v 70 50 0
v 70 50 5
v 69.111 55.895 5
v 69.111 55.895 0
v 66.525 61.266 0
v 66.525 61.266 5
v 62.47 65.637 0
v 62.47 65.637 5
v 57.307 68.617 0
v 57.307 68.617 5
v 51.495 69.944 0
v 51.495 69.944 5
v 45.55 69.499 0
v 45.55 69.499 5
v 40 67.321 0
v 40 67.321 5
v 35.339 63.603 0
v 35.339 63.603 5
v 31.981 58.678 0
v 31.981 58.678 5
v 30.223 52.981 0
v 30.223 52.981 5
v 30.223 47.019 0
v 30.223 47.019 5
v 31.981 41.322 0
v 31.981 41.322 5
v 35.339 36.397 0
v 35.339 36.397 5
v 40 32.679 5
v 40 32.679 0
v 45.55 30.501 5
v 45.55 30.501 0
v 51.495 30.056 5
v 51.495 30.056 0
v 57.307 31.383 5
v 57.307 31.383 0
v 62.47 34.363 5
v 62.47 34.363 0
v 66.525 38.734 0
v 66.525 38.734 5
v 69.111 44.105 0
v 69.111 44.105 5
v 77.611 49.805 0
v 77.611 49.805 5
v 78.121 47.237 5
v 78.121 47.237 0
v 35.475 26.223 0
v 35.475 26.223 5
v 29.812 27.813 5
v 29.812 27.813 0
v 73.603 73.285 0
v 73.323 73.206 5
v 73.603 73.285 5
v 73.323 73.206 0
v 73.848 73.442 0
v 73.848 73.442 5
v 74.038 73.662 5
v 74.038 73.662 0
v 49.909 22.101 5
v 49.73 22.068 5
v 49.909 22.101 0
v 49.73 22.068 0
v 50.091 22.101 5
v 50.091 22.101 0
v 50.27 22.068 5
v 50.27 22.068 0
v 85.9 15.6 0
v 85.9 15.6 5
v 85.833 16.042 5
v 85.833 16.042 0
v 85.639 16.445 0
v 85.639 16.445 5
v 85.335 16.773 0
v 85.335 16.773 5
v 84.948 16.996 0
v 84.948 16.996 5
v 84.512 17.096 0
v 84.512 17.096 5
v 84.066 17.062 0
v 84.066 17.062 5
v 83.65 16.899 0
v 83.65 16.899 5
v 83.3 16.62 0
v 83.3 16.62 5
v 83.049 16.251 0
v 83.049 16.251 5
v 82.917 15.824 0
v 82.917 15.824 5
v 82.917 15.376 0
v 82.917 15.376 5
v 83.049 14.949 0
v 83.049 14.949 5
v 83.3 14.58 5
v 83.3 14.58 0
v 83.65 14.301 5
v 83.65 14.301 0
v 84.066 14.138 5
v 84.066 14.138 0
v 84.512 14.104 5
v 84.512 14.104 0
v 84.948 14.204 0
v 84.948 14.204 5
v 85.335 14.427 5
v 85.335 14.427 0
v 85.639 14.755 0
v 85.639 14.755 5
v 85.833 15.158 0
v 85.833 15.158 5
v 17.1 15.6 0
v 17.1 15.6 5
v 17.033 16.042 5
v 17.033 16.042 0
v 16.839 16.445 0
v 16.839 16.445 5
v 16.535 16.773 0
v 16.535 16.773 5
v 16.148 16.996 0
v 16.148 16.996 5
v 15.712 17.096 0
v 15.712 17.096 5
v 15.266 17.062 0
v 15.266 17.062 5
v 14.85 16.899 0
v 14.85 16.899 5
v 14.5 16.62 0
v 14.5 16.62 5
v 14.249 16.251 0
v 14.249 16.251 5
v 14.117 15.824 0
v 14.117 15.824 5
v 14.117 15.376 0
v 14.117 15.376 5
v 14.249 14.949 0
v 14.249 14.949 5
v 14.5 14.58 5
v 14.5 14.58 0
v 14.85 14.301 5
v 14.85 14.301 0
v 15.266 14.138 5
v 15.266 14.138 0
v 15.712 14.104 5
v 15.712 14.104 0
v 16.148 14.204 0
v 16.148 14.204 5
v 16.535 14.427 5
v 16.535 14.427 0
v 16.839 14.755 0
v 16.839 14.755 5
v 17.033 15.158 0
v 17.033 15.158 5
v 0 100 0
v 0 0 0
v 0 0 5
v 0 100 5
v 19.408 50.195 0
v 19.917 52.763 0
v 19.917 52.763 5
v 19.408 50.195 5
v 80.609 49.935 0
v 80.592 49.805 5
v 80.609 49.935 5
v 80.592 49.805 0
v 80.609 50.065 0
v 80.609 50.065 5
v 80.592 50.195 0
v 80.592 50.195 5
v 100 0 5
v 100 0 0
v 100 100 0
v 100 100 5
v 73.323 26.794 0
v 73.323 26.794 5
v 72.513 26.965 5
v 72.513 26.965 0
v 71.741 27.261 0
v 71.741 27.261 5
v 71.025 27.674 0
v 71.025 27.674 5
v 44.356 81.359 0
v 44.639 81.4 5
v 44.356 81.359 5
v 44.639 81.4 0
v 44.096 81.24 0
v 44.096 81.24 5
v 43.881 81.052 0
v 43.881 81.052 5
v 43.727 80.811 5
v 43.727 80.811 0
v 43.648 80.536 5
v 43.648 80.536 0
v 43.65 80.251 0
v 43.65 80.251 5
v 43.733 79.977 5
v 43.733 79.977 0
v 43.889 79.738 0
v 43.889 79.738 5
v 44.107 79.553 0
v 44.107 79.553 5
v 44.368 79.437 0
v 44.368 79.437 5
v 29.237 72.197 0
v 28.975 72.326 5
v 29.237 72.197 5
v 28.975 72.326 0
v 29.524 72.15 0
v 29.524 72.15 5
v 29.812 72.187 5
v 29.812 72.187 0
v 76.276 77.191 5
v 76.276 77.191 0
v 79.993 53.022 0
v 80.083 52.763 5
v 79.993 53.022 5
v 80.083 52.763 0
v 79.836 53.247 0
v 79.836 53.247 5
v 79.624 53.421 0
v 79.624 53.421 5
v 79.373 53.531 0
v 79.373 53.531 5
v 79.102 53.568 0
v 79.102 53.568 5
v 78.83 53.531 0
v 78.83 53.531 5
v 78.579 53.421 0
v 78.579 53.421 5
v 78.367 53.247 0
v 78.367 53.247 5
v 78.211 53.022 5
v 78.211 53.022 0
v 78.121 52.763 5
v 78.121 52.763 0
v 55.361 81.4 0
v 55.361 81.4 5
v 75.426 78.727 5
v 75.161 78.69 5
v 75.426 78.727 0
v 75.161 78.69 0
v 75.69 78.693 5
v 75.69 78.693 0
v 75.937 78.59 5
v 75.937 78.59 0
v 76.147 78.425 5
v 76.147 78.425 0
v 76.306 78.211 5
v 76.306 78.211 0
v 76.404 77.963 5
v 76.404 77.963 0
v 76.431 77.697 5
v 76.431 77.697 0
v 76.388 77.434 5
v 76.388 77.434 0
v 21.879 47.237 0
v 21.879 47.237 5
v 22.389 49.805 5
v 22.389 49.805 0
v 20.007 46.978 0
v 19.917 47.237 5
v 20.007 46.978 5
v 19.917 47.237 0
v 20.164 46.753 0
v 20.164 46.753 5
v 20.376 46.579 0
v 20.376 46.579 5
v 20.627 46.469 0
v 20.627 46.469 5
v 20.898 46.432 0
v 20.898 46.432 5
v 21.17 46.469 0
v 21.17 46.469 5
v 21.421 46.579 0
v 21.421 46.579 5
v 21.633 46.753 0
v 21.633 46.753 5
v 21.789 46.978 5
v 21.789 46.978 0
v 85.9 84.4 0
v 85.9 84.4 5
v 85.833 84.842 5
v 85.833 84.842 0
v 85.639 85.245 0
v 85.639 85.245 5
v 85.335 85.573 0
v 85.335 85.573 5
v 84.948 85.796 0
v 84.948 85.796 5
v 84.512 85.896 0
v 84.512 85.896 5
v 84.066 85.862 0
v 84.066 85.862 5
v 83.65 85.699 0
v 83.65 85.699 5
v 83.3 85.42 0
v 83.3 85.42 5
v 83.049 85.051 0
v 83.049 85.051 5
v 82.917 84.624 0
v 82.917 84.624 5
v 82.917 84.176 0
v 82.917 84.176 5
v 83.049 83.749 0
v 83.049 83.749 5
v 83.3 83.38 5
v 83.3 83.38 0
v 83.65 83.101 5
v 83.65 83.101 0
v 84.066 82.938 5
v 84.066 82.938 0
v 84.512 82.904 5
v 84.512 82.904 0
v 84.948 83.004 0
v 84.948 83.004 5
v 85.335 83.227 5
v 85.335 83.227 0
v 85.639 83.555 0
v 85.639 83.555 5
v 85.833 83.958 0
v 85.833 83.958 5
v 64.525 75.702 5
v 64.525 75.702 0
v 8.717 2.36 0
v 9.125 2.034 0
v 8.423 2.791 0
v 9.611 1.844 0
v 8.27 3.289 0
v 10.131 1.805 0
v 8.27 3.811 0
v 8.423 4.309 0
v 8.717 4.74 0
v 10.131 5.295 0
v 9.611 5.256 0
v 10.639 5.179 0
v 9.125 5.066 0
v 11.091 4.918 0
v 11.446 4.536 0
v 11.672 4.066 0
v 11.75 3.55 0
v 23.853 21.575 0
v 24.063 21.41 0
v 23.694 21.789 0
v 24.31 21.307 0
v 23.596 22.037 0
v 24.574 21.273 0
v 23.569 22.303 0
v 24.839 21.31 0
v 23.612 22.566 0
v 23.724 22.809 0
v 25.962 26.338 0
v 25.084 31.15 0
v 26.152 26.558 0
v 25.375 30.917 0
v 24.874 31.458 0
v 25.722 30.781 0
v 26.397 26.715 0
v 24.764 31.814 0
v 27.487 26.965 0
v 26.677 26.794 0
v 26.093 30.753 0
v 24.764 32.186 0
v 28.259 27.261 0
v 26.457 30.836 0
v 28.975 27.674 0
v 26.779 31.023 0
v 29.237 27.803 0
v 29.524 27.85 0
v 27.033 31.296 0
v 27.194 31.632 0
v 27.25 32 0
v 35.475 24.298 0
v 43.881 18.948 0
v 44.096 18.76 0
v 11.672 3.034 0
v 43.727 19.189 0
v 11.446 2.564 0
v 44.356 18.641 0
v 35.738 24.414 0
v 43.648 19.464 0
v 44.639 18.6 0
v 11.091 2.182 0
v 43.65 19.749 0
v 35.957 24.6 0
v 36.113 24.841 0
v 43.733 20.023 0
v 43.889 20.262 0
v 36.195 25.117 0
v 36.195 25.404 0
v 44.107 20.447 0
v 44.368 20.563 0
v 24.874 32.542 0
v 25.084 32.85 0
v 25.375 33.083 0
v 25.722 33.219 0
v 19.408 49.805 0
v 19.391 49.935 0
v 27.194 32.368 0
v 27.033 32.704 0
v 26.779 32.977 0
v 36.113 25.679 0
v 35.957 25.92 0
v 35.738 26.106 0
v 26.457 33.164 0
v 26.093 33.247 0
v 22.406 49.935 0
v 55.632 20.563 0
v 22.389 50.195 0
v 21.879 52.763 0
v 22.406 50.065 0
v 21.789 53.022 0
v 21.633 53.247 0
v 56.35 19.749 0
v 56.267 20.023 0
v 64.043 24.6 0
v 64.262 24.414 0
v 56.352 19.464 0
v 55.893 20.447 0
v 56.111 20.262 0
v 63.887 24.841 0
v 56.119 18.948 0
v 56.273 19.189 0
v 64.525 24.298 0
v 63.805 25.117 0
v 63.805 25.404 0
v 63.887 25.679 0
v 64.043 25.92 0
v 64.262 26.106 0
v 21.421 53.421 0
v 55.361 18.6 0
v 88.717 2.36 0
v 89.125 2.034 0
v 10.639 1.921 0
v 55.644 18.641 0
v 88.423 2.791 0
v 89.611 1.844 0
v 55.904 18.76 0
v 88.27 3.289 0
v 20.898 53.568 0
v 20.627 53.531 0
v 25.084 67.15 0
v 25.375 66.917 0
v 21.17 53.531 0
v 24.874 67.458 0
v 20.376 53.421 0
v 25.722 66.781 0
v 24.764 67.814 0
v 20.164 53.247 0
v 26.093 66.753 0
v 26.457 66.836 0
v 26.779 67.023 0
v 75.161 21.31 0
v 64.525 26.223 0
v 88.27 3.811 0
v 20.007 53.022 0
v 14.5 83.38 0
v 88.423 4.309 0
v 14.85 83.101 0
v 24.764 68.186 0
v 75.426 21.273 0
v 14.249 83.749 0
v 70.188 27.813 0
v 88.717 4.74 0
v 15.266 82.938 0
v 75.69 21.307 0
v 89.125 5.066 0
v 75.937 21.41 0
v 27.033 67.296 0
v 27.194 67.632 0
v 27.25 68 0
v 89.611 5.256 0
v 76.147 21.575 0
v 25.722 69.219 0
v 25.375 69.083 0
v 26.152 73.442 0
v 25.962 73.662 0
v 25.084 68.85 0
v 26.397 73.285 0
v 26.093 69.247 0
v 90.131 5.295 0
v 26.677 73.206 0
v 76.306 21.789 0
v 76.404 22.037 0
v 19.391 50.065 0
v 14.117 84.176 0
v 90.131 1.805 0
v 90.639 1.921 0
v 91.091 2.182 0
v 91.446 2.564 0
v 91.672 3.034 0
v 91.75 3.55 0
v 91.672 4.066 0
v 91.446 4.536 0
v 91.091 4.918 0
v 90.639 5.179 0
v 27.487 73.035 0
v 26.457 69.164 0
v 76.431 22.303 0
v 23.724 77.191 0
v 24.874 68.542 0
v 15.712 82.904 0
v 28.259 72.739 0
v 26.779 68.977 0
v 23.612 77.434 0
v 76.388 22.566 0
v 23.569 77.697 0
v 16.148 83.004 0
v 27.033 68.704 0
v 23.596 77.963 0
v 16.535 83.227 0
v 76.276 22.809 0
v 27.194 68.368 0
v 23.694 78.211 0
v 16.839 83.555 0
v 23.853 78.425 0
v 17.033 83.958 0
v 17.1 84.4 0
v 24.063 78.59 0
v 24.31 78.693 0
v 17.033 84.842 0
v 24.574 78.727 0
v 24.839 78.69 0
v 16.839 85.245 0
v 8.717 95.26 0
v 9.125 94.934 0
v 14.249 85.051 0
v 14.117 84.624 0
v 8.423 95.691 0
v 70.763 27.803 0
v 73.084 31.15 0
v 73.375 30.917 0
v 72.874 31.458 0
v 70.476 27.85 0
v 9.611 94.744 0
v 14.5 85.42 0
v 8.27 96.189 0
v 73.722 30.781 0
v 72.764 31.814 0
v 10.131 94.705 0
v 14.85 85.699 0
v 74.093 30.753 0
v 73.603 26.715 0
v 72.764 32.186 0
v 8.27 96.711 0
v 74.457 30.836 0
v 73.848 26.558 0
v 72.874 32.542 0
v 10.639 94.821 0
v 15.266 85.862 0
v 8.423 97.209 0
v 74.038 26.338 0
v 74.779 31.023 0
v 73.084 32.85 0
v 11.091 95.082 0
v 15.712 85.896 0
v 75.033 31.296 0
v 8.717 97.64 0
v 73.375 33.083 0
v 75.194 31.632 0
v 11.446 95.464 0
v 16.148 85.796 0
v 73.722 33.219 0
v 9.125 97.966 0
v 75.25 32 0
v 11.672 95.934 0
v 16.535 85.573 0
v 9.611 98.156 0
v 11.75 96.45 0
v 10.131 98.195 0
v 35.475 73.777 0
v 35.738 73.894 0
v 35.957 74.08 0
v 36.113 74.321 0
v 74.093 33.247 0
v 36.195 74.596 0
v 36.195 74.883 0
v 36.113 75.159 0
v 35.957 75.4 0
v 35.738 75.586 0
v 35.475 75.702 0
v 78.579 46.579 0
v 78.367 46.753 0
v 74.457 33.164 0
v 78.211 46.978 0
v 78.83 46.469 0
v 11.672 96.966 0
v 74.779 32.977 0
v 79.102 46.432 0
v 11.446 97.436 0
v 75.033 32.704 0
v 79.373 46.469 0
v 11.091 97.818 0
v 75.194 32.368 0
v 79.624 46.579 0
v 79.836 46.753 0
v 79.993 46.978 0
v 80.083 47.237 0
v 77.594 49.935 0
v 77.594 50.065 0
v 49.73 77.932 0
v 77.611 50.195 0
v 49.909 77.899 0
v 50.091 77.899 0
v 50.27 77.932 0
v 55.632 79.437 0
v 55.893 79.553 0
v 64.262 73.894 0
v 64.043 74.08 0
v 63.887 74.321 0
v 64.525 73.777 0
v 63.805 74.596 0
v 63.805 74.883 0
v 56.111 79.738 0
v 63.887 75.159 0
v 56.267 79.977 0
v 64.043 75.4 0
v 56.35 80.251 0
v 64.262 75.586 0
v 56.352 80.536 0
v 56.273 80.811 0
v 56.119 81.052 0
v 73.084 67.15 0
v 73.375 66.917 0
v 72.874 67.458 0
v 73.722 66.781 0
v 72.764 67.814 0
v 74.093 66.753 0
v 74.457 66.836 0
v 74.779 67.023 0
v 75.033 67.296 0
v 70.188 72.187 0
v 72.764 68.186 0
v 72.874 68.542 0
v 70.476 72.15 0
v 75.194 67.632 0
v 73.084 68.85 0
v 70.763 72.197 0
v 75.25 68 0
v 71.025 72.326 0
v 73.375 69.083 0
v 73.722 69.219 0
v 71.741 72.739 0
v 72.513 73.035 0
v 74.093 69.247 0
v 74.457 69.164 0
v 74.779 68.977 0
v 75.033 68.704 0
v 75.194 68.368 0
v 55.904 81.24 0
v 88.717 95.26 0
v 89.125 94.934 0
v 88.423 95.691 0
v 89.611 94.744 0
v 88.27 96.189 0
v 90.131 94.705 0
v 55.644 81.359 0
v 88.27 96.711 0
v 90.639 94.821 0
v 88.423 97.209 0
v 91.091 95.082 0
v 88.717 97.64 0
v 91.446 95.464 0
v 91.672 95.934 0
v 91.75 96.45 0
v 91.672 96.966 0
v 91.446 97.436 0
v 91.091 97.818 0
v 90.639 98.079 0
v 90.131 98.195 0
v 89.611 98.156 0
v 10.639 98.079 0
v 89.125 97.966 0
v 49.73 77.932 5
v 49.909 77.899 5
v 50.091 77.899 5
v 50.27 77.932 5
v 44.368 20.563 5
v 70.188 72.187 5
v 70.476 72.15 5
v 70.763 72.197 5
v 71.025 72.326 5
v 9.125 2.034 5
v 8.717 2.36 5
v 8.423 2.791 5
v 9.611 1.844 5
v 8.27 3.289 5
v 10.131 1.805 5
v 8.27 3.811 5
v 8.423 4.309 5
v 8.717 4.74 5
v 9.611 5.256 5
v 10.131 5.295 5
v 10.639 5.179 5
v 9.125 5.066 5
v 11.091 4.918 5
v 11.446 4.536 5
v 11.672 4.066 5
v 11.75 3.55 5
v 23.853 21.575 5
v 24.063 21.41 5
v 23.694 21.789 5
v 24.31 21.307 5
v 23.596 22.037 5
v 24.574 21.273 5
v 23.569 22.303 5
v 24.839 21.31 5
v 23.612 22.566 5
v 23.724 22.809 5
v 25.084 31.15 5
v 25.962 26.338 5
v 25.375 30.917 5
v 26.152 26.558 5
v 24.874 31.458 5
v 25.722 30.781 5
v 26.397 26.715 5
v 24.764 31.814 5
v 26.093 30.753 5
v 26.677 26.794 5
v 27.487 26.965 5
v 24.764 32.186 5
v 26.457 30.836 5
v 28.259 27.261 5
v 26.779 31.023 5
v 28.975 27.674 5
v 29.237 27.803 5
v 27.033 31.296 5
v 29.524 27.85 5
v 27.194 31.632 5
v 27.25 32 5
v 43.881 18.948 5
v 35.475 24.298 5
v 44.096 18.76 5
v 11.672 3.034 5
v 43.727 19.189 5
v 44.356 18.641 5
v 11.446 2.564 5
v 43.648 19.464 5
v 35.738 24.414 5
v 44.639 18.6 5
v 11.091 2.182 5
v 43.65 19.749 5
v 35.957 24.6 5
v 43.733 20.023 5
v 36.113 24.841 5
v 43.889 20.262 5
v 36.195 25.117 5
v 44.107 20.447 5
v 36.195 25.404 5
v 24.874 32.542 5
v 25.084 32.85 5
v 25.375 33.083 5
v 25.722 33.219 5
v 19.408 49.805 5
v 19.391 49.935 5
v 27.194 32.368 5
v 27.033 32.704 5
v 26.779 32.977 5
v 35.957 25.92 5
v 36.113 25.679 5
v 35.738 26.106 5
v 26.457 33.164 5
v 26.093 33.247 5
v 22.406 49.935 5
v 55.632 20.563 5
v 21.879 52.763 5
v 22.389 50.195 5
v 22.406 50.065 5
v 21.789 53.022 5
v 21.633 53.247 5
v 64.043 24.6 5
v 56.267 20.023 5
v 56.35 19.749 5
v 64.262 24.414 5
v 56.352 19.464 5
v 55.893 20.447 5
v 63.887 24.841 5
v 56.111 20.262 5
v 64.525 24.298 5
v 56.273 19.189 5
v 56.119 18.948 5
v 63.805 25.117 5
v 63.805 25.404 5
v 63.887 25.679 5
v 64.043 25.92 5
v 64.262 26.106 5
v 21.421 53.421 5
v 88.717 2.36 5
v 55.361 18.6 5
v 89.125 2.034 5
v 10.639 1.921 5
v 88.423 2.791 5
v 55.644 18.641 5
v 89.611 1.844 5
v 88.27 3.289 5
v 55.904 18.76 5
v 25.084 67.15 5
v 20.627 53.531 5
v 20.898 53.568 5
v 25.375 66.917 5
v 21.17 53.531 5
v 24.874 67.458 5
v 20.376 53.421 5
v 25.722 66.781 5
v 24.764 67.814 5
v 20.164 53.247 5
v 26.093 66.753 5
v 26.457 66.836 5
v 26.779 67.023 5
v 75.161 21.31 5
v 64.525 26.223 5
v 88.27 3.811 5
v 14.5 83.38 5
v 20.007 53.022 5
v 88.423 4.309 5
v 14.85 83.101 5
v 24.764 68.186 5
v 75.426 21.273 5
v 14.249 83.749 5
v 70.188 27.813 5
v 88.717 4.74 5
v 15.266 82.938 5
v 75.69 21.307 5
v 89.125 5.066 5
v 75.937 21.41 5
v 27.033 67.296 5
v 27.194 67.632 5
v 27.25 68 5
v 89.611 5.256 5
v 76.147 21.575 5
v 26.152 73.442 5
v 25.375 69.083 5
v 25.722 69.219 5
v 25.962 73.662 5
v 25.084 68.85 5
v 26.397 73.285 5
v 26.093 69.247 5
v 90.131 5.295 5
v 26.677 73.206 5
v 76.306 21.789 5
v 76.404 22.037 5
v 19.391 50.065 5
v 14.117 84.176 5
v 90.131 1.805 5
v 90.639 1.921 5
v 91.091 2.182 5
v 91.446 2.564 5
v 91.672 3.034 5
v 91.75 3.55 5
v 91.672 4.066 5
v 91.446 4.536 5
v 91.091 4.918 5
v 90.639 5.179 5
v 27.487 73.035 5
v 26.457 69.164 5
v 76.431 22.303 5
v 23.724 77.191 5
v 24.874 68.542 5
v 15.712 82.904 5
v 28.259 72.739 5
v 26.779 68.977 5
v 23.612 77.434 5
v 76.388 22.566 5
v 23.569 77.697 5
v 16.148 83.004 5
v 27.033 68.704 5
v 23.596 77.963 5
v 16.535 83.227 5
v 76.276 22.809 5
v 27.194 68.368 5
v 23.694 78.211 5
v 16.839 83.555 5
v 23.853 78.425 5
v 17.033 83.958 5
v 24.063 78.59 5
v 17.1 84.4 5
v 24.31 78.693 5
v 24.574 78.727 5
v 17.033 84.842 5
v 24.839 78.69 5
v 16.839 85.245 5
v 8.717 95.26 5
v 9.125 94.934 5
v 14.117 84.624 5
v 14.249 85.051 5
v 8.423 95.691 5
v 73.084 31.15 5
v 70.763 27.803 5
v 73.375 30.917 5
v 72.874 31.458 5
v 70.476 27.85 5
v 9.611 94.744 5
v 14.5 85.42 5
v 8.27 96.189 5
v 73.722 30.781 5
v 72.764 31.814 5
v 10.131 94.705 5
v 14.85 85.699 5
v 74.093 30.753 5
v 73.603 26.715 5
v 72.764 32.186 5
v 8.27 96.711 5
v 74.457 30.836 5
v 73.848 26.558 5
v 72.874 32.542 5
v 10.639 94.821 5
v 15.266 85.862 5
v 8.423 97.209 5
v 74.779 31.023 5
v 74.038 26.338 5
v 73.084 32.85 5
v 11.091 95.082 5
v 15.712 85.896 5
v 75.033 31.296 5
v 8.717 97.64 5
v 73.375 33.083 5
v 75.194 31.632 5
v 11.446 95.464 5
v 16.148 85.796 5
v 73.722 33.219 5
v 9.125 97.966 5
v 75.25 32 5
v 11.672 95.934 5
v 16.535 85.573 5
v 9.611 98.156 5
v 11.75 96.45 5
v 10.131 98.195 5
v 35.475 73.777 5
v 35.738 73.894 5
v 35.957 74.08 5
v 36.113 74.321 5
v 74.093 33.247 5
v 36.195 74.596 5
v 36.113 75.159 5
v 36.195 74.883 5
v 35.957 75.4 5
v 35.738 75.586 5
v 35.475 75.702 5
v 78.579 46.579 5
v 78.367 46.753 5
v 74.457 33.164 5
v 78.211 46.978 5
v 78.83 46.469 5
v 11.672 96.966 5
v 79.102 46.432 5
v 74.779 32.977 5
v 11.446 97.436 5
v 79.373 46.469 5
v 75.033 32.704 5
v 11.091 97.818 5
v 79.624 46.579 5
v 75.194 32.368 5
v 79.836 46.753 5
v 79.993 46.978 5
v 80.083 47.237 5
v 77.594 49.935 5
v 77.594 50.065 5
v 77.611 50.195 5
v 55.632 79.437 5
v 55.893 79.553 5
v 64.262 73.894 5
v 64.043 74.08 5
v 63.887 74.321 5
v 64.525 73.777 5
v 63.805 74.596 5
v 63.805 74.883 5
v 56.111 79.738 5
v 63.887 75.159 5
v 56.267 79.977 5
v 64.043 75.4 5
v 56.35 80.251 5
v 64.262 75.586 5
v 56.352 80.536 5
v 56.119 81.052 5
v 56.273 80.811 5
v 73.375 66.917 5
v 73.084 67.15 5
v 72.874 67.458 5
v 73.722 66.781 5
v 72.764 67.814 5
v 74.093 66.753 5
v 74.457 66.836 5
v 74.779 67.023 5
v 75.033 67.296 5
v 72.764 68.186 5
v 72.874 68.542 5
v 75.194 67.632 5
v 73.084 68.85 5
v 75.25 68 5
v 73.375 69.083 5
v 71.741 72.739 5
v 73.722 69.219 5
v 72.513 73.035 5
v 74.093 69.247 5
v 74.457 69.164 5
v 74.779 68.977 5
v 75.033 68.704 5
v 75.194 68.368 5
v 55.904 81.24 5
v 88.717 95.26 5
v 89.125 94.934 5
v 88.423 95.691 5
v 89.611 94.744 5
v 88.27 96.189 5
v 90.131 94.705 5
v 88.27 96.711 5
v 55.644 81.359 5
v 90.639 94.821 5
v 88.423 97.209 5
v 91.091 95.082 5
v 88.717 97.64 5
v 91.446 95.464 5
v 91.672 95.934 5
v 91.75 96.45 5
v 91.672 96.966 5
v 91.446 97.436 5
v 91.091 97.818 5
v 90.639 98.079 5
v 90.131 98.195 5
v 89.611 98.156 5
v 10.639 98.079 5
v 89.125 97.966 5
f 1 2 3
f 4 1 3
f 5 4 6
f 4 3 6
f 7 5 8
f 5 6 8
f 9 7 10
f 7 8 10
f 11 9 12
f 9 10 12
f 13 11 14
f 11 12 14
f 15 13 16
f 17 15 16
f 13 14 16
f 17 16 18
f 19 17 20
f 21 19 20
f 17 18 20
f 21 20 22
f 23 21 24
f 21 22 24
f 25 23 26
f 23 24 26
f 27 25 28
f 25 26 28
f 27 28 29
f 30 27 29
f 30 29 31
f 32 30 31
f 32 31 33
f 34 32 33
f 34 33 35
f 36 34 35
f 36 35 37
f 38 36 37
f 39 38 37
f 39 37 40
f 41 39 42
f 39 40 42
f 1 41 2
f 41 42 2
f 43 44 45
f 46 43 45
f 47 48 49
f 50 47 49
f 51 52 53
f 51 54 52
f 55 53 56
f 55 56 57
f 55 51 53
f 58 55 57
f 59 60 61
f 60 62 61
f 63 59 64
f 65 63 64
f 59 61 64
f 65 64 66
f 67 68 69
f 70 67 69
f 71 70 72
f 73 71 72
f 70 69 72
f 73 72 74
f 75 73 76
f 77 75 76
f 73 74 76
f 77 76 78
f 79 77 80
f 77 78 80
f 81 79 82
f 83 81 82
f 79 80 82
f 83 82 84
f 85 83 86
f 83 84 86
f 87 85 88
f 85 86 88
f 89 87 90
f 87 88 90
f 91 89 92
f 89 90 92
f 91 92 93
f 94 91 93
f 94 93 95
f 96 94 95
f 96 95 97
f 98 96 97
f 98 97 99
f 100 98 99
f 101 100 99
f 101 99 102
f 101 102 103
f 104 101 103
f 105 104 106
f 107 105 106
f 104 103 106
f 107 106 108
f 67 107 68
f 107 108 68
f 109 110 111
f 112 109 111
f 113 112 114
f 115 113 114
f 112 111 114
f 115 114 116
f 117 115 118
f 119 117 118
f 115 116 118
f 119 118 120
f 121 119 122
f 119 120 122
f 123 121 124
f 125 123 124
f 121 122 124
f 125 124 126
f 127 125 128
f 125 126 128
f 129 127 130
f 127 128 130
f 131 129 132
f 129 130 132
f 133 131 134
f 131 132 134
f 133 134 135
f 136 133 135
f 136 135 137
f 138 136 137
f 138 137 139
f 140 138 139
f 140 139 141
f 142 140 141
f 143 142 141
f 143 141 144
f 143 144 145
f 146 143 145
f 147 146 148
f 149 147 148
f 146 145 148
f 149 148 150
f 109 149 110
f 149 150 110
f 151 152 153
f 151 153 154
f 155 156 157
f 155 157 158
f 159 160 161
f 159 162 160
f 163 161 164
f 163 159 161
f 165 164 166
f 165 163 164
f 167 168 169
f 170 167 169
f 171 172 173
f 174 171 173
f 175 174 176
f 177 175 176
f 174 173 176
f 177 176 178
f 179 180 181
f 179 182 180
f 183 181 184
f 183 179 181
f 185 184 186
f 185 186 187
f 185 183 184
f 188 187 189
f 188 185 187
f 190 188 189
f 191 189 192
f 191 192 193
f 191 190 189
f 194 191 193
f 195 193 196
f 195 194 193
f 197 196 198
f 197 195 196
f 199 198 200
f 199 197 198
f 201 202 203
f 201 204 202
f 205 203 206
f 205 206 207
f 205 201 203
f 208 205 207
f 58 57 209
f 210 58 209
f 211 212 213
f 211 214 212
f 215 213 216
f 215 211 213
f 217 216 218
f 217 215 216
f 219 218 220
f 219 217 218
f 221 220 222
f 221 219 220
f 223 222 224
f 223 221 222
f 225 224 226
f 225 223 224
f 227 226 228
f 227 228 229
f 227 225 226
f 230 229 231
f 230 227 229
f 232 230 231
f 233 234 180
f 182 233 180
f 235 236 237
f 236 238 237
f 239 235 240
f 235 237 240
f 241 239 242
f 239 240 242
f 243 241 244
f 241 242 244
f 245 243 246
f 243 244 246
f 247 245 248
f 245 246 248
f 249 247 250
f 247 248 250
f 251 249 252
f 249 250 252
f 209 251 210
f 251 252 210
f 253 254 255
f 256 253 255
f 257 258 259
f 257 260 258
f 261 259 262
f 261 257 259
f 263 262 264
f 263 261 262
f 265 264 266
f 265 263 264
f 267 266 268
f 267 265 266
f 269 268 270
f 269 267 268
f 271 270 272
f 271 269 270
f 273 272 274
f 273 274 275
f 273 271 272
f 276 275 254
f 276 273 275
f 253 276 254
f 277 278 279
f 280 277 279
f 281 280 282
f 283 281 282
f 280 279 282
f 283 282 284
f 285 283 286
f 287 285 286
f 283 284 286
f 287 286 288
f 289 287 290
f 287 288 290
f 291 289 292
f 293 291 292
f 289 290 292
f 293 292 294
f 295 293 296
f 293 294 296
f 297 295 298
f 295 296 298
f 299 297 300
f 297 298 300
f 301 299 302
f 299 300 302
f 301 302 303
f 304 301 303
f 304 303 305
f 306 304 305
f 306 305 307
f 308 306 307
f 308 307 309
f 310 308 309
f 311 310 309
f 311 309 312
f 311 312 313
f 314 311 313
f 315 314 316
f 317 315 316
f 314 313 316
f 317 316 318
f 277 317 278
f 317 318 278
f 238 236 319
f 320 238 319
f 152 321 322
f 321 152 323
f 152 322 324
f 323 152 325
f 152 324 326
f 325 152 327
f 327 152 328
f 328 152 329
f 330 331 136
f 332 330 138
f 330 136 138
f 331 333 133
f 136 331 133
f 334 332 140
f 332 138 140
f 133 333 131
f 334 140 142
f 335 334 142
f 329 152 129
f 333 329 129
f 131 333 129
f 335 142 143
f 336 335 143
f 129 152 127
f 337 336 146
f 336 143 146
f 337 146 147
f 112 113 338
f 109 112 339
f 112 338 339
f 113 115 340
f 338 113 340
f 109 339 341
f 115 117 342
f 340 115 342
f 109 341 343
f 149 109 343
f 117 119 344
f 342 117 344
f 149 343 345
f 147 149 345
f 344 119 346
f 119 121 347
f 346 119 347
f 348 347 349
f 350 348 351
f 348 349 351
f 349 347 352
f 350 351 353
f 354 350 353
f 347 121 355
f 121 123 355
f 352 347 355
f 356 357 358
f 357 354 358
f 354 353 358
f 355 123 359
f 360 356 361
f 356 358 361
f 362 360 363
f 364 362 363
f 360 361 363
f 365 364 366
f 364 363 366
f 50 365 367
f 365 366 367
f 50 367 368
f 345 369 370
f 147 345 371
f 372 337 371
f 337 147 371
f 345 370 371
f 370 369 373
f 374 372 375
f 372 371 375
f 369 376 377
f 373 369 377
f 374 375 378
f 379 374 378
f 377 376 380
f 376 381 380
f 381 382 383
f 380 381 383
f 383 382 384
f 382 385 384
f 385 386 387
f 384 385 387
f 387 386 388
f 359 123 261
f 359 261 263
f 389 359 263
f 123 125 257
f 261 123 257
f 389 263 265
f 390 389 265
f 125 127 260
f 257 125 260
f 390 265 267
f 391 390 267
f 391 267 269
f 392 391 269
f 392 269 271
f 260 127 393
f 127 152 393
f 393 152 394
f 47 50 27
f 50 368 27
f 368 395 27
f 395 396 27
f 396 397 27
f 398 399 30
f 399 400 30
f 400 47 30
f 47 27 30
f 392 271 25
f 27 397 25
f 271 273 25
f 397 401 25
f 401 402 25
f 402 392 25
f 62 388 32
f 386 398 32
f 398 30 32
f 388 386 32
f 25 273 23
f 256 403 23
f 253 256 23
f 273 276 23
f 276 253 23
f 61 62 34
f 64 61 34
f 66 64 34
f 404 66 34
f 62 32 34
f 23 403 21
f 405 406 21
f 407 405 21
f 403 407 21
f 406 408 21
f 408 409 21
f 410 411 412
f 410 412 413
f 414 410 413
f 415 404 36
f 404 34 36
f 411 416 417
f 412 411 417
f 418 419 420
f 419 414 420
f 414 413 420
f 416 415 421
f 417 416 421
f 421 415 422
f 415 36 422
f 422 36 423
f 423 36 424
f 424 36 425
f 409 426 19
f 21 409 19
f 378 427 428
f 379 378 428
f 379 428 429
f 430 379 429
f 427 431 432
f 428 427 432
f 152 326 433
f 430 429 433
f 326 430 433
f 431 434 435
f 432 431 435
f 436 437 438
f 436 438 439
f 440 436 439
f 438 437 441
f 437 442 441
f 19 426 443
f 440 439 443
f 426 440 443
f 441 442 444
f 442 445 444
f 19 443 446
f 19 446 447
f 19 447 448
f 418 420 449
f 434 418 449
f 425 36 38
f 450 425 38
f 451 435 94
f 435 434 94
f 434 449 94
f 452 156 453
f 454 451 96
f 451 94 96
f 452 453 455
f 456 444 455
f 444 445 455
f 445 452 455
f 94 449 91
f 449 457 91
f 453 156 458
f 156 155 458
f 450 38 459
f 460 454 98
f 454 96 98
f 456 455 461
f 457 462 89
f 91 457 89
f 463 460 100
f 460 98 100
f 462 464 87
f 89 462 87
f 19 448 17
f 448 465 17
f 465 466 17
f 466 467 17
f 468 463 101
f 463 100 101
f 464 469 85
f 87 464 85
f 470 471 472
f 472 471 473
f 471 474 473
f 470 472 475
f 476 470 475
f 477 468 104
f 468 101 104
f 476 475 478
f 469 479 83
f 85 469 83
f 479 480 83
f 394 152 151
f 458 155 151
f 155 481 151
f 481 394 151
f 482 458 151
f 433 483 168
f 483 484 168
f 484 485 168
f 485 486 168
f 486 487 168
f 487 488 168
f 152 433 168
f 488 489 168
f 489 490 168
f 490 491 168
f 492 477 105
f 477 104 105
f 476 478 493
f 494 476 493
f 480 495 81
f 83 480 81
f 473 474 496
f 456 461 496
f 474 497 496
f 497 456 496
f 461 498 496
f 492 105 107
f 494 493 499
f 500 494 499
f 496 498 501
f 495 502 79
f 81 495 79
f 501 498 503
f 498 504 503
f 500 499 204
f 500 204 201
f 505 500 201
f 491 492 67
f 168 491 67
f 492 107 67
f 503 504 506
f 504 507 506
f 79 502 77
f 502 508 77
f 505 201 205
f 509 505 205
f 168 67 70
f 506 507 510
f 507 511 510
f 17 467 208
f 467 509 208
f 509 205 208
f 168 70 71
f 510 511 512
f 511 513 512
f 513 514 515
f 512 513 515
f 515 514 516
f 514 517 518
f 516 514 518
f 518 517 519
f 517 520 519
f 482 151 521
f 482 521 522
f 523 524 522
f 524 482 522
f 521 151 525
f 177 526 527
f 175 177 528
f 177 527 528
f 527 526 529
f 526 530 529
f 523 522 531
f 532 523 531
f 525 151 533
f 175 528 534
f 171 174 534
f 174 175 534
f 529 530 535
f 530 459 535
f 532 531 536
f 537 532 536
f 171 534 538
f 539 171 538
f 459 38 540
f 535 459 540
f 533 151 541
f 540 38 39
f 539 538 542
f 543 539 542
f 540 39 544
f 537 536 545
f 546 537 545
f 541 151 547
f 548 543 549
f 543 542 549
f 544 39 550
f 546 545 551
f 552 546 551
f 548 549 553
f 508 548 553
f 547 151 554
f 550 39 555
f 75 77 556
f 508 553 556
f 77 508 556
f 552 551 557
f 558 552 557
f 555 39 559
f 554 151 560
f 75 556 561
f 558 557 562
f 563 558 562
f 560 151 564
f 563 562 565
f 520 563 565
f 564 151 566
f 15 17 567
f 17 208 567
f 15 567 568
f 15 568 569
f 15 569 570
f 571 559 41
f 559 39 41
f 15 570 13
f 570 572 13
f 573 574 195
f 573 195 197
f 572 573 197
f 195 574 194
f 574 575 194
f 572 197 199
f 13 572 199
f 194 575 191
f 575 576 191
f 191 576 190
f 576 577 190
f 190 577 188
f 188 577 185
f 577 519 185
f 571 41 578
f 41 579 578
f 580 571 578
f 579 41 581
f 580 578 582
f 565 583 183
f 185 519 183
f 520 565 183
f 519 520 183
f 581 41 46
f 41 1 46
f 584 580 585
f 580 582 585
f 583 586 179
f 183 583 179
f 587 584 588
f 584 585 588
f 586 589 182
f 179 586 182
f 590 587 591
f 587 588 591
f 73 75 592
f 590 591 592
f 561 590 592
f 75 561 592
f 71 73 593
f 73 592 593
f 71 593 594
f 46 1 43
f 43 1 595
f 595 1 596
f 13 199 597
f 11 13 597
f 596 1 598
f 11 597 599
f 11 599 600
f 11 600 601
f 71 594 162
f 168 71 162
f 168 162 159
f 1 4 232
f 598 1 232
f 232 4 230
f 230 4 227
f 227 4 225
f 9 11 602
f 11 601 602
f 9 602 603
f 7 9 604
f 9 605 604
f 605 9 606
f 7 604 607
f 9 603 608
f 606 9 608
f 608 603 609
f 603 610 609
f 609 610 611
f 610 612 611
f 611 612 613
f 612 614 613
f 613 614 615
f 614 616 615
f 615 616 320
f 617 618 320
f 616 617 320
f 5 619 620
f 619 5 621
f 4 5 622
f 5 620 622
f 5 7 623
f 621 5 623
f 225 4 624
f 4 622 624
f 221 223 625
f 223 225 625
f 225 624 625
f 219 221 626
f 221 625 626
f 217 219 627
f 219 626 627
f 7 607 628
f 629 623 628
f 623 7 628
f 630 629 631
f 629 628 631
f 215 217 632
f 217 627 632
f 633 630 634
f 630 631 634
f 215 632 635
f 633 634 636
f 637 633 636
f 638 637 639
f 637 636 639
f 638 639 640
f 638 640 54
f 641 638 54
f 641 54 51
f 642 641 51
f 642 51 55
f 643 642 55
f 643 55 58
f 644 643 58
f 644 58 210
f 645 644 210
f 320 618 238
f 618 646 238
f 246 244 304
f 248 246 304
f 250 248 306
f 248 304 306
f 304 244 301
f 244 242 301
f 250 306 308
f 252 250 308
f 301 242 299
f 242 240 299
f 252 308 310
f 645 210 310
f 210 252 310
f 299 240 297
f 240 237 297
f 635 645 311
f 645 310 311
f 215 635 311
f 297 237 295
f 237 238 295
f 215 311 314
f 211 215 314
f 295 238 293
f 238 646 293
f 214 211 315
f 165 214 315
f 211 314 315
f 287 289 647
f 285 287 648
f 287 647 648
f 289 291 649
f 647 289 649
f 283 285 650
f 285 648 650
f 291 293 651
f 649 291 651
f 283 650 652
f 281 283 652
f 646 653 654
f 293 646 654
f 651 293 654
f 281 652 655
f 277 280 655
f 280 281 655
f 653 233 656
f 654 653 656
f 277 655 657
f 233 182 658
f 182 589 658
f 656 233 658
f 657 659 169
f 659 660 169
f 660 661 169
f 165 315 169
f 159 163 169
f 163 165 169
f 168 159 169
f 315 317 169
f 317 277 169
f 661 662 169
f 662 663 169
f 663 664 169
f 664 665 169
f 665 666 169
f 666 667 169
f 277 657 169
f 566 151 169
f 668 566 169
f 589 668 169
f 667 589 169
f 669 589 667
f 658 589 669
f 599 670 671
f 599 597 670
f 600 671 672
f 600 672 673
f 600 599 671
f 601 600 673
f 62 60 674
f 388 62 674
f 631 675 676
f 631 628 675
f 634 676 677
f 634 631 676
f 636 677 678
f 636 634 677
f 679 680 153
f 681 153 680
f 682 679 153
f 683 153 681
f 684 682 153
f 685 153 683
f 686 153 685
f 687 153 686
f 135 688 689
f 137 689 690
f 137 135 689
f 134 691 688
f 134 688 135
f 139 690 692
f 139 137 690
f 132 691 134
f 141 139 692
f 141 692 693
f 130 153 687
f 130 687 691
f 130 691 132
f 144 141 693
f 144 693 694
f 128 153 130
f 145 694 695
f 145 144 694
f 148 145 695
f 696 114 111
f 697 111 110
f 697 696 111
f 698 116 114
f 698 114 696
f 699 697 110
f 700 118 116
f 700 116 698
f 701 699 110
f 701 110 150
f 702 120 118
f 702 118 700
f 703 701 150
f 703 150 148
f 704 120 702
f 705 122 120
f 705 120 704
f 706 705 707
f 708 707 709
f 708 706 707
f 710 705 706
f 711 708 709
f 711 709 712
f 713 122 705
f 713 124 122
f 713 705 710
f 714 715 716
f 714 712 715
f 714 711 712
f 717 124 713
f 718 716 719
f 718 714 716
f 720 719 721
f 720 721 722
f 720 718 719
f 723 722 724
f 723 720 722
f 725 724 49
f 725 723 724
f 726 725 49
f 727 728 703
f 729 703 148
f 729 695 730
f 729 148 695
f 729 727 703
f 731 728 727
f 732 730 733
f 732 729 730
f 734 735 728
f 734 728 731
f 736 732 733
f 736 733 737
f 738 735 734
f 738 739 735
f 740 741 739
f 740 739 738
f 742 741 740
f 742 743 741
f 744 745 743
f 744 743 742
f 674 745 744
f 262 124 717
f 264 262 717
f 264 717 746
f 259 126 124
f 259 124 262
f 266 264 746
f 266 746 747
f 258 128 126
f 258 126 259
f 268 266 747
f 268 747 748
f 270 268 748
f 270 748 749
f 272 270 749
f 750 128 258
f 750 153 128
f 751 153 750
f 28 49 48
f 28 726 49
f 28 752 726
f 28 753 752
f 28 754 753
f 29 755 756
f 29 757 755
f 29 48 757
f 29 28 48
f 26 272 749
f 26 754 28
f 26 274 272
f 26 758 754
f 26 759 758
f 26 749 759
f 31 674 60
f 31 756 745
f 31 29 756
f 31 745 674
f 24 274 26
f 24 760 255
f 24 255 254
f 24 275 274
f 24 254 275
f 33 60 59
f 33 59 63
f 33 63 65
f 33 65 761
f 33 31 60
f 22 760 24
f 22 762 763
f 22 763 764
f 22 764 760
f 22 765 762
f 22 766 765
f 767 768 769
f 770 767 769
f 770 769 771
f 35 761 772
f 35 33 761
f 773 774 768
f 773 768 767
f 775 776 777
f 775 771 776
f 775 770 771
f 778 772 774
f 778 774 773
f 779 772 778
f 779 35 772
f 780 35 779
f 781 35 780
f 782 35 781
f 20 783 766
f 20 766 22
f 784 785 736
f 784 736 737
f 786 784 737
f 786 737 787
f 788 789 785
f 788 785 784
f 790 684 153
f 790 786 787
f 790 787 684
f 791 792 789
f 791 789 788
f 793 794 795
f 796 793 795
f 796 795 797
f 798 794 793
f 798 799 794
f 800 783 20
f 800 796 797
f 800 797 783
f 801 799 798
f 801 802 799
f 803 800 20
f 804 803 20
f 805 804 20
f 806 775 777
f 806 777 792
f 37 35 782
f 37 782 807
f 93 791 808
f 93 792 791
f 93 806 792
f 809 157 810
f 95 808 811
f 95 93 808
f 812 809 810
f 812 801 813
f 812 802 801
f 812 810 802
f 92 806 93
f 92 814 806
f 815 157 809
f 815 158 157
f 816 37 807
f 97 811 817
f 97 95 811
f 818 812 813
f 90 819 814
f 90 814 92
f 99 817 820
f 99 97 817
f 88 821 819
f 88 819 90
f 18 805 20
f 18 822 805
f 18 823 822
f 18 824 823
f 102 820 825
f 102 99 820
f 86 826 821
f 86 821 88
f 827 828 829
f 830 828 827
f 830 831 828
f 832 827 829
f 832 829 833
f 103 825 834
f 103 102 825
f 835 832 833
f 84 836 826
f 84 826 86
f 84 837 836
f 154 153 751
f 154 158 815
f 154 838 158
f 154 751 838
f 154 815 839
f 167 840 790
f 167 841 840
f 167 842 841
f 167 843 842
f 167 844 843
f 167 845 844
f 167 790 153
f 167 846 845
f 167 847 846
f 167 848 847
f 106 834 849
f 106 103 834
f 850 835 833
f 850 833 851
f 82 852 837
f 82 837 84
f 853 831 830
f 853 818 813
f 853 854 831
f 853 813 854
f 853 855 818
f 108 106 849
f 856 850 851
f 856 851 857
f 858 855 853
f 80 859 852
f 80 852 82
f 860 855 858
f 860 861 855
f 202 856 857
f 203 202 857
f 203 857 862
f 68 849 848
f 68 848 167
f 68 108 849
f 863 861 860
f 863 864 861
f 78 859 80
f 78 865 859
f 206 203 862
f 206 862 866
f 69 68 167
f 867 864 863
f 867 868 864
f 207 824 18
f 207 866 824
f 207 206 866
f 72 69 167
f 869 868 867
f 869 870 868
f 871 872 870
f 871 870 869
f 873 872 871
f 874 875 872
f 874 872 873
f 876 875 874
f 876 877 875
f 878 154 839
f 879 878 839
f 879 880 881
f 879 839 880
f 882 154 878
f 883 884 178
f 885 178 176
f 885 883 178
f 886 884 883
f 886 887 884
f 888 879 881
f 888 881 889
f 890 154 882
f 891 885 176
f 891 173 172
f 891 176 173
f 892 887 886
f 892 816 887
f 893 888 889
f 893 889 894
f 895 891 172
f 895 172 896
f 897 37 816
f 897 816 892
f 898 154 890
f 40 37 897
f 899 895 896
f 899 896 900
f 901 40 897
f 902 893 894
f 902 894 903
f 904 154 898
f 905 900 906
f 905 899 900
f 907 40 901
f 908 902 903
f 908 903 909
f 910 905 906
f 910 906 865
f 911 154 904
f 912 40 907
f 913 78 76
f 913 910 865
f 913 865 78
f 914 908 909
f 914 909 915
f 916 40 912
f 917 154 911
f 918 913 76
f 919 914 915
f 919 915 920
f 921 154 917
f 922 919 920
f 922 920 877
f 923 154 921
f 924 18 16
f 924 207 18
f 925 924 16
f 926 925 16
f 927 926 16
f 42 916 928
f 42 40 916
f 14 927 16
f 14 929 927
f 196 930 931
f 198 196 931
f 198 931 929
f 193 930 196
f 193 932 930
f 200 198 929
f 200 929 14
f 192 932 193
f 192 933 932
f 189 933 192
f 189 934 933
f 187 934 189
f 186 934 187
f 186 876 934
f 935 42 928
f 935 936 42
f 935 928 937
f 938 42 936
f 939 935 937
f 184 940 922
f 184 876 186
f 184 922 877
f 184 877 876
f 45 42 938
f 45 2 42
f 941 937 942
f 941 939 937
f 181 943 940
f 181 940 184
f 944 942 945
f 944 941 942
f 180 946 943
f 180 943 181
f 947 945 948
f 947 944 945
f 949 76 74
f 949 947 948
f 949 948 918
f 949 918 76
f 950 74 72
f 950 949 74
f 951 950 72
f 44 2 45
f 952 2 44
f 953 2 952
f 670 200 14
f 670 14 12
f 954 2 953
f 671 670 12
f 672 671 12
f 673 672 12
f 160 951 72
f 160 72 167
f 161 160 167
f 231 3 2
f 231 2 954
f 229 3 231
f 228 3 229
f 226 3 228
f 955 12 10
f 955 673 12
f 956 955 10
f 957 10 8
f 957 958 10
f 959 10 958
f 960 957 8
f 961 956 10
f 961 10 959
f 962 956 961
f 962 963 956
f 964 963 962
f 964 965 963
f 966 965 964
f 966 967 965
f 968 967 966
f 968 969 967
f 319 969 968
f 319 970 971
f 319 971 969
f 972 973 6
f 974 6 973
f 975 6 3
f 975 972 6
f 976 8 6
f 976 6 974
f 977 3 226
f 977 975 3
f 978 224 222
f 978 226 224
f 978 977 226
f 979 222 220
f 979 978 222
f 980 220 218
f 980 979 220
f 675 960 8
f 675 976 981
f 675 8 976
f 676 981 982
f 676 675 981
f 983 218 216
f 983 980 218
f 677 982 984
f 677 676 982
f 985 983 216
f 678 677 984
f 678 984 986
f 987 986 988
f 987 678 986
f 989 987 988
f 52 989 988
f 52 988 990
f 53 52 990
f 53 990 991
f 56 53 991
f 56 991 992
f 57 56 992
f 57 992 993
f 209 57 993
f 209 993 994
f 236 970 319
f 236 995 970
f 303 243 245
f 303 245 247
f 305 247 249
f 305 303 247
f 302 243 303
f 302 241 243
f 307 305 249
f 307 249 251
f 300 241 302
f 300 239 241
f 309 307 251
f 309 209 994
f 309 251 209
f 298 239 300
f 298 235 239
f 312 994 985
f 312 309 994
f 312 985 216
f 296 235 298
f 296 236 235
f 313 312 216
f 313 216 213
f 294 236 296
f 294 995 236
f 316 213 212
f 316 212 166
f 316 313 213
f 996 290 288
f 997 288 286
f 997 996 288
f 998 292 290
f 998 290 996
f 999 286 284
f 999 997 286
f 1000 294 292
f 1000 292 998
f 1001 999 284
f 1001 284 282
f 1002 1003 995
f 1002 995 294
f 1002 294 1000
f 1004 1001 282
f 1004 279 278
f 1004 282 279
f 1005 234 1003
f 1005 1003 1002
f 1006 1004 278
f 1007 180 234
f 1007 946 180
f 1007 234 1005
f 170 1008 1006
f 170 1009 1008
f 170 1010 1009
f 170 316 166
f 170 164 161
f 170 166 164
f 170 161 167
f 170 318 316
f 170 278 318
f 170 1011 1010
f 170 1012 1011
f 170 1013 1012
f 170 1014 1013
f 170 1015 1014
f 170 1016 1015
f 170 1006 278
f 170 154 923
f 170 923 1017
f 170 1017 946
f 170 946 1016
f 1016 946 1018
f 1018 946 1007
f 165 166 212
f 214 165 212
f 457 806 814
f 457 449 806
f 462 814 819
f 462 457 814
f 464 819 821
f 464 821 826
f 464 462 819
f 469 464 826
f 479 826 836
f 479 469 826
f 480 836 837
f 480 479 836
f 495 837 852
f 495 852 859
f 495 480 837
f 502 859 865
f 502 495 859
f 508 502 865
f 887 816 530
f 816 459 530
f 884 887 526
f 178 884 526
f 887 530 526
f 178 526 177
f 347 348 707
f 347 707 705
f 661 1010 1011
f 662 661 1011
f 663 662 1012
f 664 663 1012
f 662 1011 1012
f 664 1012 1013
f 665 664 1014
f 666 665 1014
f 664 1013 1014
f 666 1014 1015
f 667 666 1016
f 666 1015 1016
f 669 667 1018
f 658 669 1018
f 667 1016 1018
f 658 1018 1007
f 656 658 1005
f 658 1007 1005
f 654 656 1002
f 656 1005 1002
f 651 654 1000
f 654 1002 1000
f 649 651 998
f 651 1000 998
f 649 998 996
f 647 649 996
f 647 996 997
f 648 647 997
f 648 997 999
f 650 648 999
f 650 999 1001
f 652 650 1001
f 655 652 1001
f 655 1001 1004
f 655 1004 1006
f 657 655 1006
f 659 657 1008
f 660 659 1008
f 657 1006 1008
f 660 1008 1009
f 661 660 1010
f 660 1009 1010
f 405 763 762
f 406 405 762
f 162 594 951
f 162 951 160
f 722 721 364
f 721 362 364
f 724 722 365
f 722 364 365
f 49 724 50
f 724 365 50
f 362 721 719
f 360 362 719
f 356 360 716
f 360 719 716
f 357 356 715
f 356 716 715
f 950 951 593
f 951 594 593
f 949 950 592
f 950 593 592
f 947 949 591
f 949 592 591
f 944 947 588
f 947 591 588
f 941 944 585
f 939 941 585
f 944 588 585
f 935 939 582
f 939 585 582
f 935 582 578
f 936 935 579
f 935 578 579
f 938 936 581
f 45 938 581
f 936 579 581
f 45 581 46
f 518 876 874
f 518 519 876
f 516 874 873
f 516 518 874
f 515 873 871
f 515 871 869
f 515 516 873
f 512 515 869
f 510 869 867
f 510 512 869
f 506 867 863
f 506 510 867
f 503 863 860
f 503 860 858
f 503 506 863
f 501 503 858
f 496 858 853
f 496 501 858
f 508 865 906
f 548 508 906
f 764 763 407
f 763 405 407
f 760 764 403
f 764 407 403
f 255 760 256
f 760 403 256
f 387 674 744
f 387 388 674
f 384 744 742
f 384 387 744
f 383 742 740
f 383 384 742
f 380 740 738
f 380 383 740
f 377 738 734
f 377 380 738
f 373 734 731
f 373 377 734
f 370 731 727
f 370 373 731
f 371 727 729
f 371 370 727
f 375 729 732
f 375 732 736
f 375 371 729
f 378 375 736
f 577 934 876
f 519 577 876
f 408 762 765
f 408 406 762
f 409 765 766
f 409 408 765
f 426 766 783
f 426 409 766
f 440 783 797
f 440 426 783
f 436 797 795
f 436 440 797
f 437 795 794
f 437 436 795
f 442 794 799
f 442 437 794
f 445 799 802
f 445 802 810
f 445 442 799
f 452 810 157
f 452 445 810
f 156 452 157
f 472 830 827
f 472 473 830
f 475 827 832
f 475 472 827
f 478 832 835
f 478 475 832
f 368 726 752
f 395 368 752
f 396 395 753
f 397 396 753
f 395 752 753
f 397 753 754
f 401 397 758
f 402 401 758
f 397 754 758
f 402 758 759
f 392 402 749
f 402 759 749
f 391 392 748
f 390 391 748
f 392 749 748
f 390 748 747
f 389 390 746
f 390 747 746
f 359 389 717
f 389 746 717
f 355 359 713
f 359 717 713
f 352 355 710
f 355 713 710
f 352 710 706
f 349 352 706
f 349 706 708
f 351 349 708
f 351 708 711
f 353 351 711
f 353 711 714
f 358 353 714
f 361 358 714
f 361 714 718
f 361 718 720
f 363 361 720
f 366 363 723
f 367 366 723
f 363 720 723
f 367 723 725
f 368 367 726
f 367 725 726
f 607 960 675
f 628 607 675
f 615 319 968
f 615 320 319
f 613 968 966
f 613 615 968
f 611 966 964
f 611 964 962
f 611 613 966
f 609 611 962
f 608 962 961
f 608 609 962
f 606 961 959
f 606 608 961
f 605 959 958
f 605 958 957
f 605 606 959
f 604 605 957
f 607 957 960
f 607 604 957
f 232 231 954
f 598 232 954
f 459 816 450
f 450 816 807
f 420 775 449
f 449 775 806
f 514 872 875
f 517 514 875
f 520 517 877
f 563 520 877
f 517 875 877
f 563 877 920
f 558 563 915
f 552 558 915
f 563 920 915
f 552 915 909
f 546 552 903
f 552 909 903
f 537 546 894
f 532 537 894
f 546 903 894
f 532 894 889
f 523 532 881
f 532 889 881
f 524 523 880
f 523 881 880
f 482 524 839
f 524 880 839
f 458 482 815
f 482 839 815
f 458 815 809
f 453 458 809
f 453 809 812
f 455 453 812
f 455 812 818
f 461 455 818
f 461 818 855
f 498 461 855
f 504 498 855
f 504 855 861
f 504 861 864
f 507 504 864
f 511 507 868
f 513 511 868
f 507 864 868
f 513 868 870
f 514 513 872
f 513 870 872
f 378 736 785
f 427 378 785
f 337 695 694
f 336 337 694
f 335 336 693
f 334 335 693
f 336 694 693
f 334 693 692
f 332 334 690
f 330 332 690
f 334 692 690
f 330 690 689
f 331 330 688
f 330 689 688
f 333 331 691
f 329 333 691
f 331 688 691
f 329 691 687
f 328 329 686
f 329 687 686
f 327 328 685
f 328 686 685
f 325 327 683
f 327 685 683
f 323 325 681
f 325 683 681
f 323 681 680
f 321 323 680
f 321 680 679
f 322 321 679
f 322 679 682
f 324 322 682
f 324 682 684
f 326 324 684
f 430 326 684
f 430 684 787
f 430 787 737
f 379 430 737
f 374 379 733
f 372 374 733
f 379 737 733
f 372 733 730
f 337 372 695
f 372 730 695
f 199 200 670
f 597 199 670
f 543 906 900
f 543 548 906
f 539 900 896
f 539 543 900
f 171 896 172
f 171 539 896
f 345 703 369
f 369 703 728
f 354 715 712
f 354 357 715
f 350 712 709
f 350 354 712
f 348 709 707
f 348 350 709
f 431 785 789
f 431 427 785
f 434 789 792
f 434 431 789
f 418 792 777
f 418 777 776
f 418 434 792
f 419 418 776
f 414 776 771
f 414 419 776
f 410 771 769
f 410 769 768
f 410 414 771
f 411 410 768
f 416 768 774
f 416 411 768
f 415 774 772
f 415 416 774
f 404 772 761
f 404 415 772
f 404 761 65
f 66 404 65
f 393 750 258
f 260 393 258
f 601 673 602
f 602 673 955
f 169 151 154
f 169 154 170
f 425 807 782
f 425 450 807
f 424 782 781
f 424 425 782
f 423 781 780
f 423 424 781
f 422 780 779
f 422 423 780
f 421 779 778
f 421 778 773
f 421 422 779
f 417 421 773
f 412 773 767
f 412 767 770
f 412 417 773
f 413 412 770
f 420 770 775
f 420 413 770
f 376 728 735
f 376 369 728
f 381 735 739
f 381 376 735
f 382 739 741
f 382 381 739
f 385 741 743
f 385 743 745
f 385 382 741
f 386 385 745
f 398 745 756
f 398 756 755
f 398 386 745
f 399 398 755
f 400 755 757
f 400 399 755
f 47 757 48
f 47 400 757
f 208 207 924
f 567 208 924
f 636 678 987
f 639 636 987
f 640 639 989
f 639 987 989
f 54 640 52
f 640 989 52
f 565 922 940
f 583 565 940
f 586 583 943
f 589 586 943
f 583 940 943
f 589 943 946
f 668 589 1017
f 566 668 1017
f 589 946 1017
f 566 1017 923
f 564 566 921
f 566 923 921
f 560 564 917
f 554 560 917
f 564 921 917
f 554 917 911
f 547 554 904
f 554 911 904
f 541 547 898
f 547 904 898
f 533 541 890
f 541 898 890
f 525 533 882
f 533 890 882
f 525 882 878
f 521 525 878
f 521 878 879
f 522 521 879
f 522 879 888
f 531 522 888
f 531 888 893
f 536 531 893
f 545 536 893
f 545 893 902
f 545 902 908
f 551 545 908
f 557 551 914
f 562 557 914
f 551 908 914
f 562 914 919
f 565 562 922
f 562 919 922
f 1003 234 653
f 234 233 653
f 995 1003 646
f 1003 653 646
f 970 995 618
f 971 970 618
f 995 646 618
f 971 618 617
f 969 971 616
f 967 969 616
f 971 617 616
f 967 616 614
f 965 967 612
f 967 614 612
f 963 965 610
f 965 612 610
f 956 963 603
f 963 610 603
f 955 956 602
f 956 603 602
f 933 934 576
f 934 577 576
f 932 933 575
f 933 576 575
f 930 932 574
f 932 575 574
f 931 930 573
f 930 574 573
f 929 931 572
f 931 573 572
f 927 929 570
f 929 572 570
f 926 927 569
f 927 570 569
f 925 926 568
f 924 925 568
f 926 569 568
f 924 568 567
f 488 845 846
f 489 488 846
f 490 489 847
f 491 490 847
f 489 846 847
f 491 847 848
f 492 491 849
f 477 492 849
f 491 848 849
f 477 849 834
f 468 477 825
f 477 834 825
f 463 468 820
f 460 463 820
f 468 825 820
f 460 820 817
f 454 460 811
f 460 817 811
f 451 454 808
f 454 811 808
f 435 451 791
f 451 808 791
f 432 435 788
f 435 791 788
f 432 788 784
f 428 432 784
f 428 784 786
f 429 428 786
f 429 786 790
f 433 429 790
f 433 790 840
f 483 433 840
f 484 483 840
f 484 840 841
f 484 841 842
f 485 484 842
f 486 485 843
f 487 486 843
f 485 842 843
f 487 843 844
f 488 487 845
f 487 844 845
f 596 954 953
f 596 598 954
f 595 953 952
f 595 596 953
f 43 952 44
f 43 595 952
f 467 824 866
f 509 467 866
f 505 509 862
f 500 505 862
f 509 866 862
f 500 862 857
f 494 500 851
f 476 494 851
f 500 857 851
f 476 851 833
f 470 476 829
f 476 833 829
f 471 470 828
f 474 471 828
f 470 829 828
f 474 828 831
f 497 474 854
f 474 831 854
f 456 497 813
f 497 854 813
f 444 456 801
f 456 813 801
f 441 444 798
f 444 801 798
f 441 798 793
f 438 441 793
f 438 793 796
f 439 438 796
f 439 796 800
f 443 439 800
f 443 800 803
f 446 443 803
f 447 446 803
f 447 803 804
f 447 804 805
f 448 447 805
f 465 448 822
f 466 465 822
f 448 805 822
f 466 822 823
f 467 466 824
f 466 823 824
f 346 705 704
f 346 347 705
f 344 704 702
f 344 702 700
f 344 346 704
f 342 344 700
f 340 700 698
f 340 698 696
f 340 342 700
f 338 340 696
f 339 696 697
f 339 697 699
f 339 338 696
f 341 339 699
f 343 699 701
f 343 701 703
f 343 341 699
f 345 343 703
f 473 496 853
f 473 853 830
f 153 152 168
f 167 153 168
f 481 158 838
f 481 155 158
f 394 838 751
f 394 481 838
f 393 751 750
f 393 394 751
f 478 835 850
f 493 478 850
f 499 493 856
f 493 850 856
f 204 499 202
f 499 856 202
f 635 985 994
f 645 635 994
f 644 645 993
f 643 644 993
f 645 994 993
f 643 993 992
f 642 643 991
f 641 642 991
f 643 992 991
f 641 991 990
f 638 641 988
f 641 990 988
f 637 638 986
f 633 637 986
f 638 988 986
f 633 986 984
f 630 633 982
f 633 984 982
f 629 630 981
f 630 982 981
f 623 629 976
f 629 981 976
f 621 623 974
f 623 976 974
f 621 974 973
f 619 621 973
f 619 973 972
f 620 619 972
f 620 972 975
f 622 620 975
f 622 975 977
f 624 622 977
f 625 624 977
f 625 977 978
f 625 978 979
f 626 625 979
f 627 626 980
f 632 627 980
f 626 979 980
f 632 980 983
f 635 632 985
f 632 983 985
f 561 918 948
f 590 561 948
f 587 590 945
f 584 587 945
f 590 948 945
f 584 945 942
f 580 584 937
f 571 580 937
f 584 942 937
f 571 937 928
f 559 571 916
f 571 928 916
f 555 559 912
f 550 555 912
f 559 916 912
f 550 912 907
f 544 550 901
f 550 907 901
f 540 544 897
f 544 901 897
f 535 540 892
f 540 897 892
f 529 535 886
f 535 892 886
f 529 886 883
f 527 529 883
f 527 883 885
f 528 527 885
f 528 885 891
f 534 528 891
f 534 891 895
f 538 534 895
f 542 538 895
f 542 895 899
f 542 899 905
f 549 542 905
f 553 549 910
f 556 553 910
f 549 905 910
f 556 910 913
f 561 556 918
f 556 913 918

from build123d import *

# Parameters (mm, degrees)
SKETCH_1_W          = 100
SKETCH_1_H          = 100
EXTRUDE_1_DEPTH     = 5
SKETCH_2_R          = 1.75
CUT_EXTRUDE_1_DEPTH = 5
SKETCH_3_R          = 1.25
SKETCH_3_R_2        = 1.5
SKETCH_3_R_3        = 20
CUT_EXTRUDE_2_DEPTH = 5
CUT_EXTRUDE_3_DEPTH = 5
FILLET_27_R         = 1


with BuildPart() as part:
    # 草图1 → 凸台-拉伸1 (new body)
    with BuildSketch(Plane.XY):
        with Locations((50, 50)):
            Rectangle(SKETCH_1_W, SKETCH_1_H)
    extrude(amount=EXTRUDE_1_DEPTH)

    # 草图2 → 切除-拉伸1 (cut)
    with BuildSketch(Plane.XY.offset(5)):
        with Locations((10, 96.45)):
            Circle(SKETCH_2_R)
        with Locations((90, 96.45)):
            Circle(SKETCH_2_R)
        with Locations((10, 3.55)):
            Circle(SKETCH_2_R)
        with Locations((90, 3.55)):
            Circle(SKETCH_2_R)
    extrude(amount=-CUT_EXTRUDE_1_DEPTH, mode=Mode.SUBTRACT)

    # 草图3 → 切除-拉伸2 (cut)
    with BuildSketch(Plane.XY.offset(5)):
        with Locations((26, 68)):
            Circle(SKETCH_3_R)
        with Locations((74, 68)):
            Circle(SKETCH_3_R)
        with Locations((26, 32)):
            Circle(SKETCH_3_R)
        with Locations((74, 32)):
            Circle(SKETCH_3_R)
        with Locations((15.6, 84.4)):
            Circle(SKETCH_3_R_2)
        with Locations((84.4, 84.4)):
            Circle(SKETCH_3_R_2)
        with Locations((84.4, 15.6)):
            Circle(SKETCH_3_R_2)
        with Locations((15.6, 15.6)):
            Circle(SKETCH_3_R_2)
        with Locations((50, 50)):
            Circle(SKETCH_3_R_3)
    extrude(amount=-CUT_EXTRUDE_2_DEPTH, mode=Mode.SUBTRACT)

    # 草图4 → 切除-拉伸3 (cut)
    with BuildSketch(Plane.XY.offset(5)):
        Polygon((62.620906011, 81.4), (37.379093989, 81.4), (50, 77.85577297), align=None)
        with BuildLine():
            Line((38.90383284, 74.739726027), (22.326209721, 79.395085944))
            Line((22.326209721, 79.395085944), (26.226184699, 73.245125402))
            ThreePointArc((26.226184699, 73.245125402), (27.87858351, 72.902389621), (29.336878066, 72.05311544))
            Line((29.336878066, 72.05311544), (38.90383284, 74.739726027))
        make_face()
        with BuildLine():
            Line((77.673790279, 79.395085944), (61.09616716, 74.739726027))
            Line((61.09616716, 74.739726027), (70.663121934, 72.05311544))
            ThreePointArc((70.663121934, 72.05311544), (72.12141649, 72.902389621), (73.773815301, 73.245125402))
            Line((73.773815301, 73.245125402), (77.673790279, 79.395085944))
        make_face()
        Polygon((50, 22.14422703), (37.379093989, 18.6), (62.620906011, 18.6), align=None)
        with BuildLine():
            ThreePointArc((29.336878066, 27.94688456), (27.87858351, 27.097610379), (26.226184699, 26.754874598))
            Line((26.226184699, 26.754874598), (22.326209721, 20.604914056))
            Line((22.326209721, 20.604914056), (38.90383284, 25.260273973))
            Line((38.90383284, 25.260273973), (29.336878066, 27.94688456))
        make_face()
        with BuildLine():
            Line((70.663121934, 27.94688456), (61.09616716, 25.260273973))
            Line((61.09616716, 25.260273973), (77.673790279, 20.604914056))
            Line((77.673790279, 20.604914056), (73.773815301, 26.754874598))
            ThreePointArc((73.773815301, 26.754874598), (72.12141649, 27.097610379), (70.663121934, 27.94688456))
        make_face()
        Polygon((22.427480916, 50), (20.898222534, 57.70510954), (19.368964152, 50), (20.898222534, 42.29489046), align=None)
        Polygon((79.101777466, 42.29489046), (80.631035848, 50), (79.101777466, 57.70510954), (77.572519084, 50), align=None)
    extrude(amount=-CUT_EXTRUDE_3_DEPTH, mode=Mode.SUBTRACT)

    # 圆角27
    fillet_27_edges = [part.edges().sort_by_distance(p)[0] for p in [
        (29.336878066, 72.05311544, 2.5),
        (26.226184699, 73.245125402, 2.5),
        (22.326209721, 79.395085944, 2.5),
        (38.90383284, 74.739726027, 2.5),
        (73.773815301, 73.245125402, 2.5),
        (70.663121934, 72.05311544, 2.5),
        (61.09616716, 74.739726027, 2.5),
        (77.673790279, 79.395085944, 2.5),
        (26.226184699, 26.754874598, 2.5),
        (29.336878066, 27.94688456, 2.5),
        (38.90383284, 25.260273973, 2.5),
        (22.326209721, 20.604914056, 2.5),
        (50, 22.14422703, 2.5),
        (62.620906011, 18.6, 2.5),
        (37.379093989, 18.6, 2.5),
        (79.101777466, 57.70510954, 2.5),
        (80.631035848, 50, 2.5),
        (79.101777466, 42.29489046, 2.5),
        (77.572519084, 50, 2.5),
        (20.898222534, 42.29489046, 2.5),
        (19.368964152, 50, 2.5),
        (20.898222534, 57.70510954, 2.5),
        (22.427480916, 50, 2.5),
        (70.663121934, 27.94688456, 2.5),
        (73.773815301, 26.754874598, 2.5),
        (77.673790279, 20.604914056, 2.5),
        (61.09616716, 25.260273973, 2.5),
        (50, 77.85577297, 2.5),
        (37.379093989, 81.4, 2.5),
        (62.620906011, 81.4, 2.5),
    ]]
    fillet(fillet_27_edges, radius=FILLET_27_R)


solid = part.part
